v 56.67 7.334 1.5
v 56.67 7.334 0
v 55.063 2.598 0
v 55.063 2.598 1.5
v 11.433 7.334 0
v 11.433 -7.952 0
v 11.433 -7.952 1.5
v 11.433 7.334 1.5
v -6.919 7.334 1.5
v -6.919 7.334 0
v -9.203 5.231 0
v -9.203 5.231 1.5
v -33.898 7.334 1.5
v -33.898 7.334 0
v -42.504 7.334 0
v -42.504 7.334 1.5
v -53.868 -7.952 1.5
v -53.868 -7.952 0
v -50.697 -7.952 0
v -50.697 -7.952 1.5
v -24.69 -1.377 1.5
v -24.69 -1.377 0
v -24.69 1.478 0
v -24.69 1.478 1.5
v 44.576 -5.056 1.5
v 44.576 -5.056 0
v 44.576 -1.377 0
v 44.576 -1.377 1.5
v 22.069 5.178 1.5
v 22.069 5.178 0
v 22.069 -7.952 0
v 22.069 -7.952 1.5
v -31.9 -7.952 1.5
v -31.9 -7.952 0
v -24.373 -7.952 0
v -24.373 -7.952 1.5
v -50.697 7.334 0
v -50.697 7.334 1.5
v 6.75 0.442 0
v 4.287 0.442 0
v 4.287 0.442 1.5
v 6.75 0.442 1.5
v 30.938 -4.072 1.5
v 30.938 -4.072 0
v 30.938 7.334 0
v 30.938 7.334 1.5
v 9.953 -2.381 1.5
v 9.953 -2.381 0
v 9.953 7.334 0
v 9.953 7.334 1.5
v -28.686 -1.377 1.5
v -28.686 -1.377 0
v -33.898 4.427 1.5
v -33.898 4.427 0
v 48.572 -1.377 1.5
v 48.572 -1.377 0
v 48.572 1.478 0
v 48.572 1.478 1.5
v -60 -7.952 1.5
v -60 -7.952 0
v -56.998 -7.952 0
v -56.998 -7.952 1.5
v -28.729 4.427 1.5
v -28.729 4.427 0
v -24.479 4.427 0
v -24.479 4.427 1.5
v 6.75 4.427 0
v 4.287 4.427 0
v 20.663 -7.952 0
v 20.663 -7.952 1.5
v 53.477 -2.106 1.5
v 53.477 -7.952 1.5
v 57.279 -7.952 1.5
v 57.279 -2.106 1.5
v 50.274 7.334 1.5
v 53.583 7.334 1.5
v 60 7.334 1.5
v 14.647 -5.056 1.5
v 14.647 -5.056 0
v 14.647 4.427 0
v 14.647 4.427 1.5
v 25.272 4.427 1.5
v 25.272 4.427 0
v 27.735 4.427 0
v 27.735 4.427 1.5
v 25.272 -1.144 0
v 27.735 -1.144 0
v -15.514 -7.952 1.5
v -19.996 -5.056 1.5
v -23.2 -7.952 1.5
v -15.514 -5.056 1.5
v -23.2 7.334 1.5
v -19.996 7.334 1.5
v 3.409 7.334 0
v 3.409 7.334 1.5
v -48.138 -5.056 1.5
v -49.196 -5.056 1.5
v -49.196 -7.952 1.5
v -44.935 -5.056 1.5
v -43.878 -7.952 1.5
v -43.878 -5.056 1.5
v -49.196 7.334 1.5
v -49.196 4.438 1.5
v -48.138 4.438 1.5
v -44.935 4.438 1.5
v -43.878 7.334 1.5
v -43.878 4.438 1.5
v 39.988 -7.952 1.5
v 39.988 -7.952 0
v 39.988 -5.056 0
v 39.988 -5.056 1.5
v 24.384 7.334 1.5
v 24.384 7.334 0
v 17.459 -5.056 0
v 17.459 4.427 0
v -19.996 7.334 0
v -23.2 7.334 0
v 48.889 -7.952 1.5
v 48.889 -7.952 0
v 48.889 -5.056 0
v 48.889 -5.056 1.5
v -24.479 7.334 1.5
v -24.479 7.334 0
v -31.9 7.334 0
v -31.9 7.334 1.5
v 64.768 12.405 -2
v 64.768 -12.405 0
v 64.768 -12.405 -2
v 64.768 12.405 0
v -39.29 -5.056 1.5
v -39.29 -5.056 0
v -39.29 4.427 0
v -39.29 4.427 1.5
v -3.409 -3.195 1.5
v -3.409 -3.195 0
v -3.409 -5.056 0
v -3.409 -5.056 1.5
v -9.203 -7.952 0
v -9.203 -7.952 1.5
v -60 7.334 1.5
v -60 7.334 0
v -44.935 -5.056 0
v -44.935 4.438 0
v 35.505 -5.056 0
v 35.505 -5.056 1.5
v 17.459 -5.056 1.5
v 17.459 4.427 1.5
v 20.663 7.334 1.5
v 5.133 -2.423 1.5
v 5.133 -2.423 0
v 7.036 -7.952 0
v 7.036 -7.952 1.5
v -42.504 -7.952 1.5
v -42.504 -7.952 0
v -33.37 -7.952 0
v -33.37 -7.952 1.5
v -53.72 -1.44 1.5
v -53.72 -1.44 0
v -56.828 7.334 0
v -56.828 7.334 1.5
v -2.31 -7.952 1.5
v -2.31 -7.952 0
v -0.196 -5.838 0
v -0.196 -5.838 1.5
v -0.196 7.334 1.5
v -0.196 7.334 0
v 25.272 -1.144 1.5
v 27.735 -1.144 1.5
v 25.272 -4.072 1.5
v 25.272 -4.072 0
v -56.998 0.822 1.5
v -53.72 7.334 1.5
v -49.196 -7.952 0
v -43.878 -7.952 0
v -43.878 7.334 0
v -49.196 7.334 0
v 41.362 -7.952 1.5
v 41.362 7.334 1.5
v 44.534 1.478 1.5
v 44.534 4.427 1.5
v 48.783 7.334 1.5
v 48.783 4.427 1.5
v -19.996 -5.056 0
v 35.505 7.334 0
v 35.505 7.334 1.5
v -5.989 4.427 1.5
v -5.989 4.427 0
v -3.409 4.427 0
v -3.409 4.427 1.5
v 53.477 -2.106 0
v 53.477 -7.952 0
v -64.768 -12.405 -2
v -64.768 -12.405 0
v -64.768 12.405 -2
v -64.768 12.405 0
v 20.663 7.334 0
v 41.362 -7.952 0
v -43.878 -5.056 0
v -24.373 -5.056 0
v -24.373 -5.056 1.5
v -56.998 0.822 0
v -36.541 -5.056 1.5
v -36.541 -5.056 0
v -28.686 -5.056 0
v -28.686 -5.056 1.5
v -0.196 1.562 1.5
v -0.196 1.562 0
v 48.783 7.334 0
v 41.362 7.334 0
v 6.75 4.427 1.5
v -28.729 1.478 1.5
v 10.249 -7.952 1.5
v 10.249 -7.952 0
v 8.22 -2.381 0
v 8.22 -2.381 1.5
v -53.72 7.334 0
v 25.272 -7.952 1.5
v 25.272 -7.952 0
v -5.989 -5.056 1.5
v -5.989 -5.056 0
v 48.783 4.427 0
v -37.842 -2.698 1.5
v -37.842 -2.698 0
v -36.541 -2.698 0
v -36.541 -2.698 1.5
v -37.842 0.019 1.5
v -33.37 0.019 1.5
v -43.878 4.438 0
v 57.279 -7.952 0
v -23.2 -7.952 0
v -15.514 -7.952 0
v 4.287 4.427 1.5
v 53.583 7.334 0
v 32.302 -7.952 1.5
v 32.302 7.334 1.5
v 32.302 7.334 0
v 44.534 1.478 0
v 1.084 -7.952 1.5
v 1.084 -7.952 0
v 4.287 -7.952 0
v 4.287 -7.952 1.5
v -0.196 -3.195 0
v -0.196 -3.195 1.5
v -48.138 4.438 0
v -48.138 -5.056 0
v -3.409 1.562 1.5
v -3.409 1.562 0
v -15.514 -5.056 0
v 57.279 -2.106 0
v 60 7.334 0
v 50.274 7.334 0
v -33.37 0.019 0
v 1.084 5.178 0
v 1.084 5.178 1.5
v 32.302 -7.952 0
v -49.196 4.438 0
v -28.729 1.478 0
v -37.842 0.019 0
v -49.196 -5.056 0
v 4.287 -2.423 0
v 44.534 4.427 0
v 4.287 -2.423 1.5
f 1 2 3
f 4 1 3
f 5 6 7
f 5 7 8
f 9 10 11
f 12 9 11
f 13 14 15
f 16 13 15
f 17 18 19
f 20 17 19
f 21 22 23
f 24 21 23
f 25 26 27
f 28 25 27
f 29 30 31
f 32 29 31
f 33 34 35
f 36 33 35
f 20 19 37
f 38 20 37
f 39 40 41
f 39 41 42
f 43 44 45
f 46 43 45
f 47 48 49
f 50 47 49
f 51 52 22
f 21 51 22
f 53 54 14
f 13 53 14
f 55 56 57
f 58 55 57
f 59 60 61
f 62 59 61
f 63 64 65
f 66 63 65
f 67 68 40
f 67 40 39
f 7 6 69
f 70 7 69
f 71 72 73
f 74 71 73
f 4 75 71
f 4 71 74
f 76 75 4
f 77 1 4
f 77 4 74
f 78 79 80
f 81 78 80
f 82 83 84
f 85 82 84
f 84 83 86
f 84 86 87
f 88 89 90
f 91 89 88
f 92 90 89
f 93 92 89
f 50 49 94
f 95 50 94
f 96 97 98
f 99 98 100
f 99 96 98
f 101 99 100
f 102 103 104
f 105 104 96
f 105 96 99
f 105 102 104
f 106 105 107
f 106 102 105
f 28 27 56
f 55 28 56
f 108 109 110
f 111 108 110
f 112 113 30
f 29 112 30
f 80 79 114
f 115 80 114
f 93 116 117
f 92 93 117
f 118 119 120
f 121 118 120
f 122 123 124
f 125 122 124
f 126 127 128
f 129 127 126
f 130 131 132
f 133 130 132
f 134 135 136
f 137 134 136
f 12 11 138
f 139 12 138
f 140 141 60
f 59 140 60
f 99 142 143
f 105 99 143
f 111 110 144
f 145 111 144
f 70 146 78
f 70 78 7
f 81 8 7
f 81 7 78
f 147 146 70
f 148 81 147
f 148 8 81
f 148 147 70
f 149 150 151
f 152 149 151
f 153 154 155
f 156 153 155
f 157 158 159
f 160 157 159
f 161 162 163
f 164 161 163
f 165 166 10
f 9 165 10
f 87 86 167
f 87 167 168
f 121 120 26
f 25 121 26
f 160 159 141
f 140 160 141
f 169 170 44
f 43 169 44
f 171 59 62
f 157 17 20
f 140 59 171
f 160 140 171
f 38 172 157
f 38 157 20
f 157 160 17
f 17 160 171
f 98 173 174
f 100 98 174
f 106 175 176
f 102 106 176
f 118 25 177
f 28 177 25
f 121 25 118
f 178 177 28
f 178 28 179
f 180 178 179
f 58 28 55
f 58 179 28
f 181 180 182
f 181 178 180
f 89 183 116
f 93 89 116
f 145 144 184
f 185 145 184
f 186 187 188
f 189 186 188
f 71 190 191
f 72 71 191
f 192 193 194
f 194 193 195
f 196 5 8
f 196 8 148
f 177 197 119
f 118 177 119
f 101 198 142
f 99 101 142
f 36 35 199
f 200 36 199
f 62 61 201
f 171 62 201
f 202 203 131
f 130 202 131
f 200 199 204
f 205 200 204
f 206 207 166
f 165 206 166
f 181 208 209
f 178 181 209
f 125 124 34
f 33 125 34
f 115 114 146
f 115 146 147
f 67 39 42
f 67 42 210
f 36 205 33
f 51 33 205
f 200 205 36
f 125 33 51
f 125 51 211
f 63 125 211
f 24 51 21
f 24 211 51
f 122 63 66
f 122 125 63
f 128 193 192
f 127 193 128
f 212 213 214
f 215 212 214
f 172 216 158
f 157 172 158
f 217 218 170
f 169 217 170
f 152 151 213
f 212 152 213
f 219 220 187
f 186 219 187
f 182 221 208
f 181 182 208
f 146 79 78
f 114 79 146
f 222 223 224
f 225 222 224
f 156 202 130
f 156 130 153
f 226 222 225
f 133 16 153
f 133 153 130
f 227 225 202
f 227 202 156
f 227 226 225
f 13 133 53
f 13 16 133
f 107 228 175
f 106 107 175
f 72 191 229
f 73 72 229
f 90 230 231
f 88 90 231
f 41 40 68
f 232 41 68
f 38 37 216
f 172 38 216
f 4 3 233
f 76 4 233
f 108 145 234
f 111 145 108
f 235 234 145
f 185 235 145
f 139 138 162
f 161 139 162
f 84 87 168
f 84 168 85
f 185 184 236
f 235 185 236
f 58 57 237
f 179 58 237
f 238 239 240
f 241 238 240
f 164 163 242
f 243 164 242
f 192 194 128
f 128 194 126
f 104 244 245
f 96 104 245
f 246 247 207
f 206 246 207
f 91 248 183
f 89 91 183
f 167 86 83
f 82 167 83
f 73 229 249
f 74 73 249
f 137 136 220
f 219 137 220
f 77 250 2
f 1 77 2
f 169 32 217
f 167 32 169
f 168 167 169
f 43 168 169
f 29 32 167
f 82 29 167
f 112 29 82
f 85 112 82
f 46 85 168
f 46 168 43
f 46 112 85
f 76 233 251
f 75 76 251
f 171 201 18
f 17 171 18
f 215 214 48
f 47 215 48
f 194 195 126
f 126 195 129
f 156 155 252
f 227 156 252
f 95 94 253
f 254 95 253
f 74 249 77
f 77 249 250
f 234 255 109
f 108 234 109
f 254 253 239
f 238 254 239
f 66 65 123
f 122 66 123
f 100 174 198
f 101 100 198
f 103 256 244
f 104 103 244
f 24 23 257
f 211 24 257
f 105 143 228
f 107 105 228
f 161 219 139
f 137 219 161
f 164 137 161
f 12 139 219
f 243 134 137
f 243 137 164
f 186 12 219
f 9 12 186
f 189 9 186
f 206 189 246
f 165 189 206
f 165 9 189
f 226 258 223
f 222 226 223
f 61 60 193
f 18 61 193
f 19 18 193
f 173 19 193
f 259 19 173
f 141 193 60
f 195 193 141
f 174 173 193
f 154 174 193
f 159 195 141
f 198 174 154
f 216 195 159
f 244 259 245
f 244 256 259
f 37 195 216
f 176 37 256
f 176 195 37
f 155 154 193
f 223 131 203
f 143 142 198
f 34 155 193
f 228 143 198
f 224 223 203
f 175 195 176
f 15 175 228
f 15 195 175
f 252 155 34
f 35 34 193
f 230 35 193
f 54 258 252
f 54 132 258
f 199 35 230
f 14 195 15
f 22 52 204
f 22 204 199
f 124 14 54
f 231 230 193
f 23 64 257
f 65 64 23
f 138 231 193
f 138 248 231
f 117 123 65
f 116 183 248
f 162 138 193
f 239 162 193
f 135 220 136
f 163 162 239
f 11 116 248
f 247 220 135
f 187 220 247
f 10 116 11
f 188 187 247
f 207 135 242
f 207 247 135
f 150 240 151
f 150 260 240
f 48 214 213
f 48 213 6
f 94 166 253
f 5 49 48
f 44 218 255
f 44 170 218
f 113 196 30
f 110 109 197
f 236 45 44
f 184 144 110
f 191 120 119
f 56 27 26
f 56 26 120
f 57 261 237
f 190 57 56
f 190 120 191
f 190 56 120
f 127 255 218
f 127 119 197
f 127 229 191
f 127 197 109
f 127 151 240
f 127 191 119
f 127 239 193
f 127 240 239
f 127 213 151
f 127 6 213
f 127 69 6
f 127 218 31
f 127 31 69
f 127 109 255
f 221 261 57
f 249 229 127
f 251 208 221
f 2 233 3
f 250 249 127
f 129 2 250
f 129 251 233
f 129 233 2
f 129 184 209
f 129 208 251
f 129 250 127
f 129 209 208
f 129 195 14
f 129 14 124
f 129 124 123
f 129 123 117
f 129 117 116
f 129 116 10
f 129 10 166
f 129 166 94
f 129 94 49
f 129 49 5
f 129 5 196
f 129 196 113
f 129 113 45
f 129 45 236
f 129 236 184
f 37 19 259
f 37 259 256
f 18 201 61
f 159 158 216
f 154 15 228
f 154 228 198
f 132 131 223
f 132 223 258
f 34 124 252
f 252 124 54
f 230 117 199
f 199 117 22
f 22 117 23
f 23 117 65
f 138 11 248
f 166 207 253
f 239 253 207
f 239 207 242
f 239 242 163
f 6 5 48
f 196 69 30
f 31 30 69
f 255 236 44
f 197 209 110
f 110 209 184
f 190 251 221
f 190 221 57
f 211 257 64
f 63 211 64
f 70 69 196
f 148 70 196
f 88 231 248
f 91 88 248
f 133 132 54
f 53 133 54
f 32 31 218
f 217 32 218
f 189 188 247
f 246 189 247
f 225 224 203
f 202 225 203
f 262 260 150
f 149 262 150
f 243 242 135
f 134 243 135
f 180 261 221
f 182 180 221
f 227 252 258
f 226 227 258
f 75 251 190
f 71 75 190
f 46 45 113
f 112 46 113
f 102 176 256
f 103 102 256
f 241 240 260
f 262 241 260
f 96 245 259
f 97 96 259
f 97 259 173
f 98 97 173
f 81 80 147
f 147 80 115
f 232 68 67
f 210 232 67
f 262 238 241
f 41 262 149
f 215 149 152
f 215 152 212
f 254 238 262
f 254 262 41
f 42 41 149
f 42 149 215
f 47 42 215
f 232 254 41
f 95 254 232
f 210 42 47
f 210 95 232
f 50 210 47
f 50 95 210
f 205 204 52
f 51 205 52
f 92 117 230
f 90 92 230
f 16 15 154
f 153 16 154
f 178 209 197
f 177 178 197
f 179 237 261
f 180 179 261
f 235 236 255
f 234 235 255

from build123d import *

# Parameters (mm, degrees)
F0_W     = 129.536152
F0_H     = 24.80902
F2_DEPTH = 2
F1_W     = 2.46322
F1_H     = 3.985553
F1_W_2   = 9.229143
F1_H_2   = 15.286758
F1_W_3   = 2.812087
F1_H_3   = 9.482866
F1_W_4   = 2.463219
F1_H_4   = 5.571315
F3_DEPTH = 1.5


with BuildPart() as f2:
    # F0 (on Top) → F2 (new body)
    with BuildSketch(Plane.XY):
        Rectangle(F0_W, F0_H)
    extrude(amount=-F2_DEPTH)

    # F1 (on Top) → F3 (join)
    with BuildSketch(Plane.XY):
        Polygon((-53.720365, 7.334459), (-53.720365, -1.440098), (-56.82846, 7.334459), (-59.999987, 7.334459), (-59.999987, -7.952299), (-56.997608, -7.952299), (-56.997608, 0.822258), (-53.868369, -7.952299), (-50.696842, -7.952299), (-50.696842, 7.334459), align=None)
        Polygon((-43.87806, -7.952299), (-43.87806, -5.055639), (-44.935236, -5.055639), (-44.935236, 4.437799), (-43.87806, 4.437799), (-43.87806, 7.334459), (-49.195653, 7.334459), (-49.195653, 4.437799), (-48.138477, 4.437799), (-48.138477, -5.055639), (-49.195653, -5.055639), (-49.195653, -7.952299), align=None)
        Polygon((-36.541261, -2.698137), (-36.541261, -5.055639), (-39.289917, -5.055639), (-39.289917, 4.427227), (-33.898322, 4.427227), (-33.898322, 7.334459), (-42.503731, 7.334459), (-42.503731, -7.952299), (-33.369735, -7.952299), (-33.369735, 0.018804), (-37.841588, 0.018804), (-37.841588, -2.698137), align=None)
        Polygon((-24.478888, 7.334459), (-31.90026, 7.334459), (-31.90026, -7.952299), (-24.37317, -7.952299), (-24.37317, -5.055639), (-28.686446, -5.055639), (-28.686446, -1.376668), (-24.690323, -1.376668), (-24.690323, 1.477707), (-28.728733, 1.477707), (-28.728733, 4.427227), (-24.478888, 4.427227), align=None)
        Polygon((-23.199705, 7.334459), (-23.199705, -7.952299), (-15.514039, -7.952299), (-15.514039, -5.055639), (-19.996463, -5.055639), (-19.996463, 7.334459), align=None)
        Polygon((-3.409379, -3.19501), (-3.409379, -5.055639), (-5.988887, -5.055639), (-5.988887, 4.427227), (-3.409379, 4.427227), (-3.409379, 1.562281), (-0.195565, 1.562281), (-0.195565, 7.334459), (-6.919202, 7.334459), (-9.202701, 5.23068), (-9.202701, -7.952299), (-2.309916, -7.952299), (-0.195565, -5.837948), (-0.195565, -3.19501), align=None)
        Polygon((5.1326, -2.423271), (7.035516, -7.952299), (10.24933, -7.952299), (8.219553, -2.380984), (9.953321, -2.380984), (9.953321, 7.334459), (3.409404, 7.334459), (1.083618, 5.177821), (1.083618, -7.952299), (4.286859, -7.952299), (4.286859, -2.423271), align=None)
        with Locations((5.518469, 2.43445)):
            Rectangle(F1_W, F1_H, mode=Mode.SUBTRACT)
        with Locations((16.047938, -0.30892)):
            Rectangle(F1_W_2, F1_H_2)
        with Locations((16.053224, -0.314206)):
            Rectangle(F1_W_3, F1_H_3, mode=Mode.SUBTRACT)
        Polygon((22.068553, -7.952299), (25.271795, -7.952299), (25.271795, -4.072465), (30.938256, -4.072465), (30.938256, 7.334459), (24.383768, 7.334459), (22.068553, 5.177821), align=None)
        with Locations((26.503404, 1.641569)):
            Rectangle(F1_W_4, F1_H_4, mode=Mode.SUBTRACT)
        Polygon((32.302012, 7.334459), (32.302012, -7.952299), (39.987679, -7.952299), (39.987679, -5.055639), (35.505254, -5.055639), (35.505254, 7.334459), align=None)
        Polygon((48.78338, 7.334459), (41.362008, 7.334459), (41.362008, -7.952299), (48.889098, -7.952299), (48.889098, -5.055639), (44.575821, -5.055639), (44.575821, -1.376668), (48.571945, -1.376668), (48.571945, 1.477707), (44.533534, 1.477707), (44.533534, 4.427227), (48.78338, 4.427227), align=None)
        Polygon((60.000013, 7.334459), (56.66991, 7.334459), (55.063003, 2.598313), (53.582958, 7.334459), (50.273998, 7.334459), (53.477239, -2.106119), (53.477239, -7.952299), (57.278849, -7.952299), (57.278849, -2.106119), align=None)
    extrude(amount=F3_DEPTH)


solid = f2.part
